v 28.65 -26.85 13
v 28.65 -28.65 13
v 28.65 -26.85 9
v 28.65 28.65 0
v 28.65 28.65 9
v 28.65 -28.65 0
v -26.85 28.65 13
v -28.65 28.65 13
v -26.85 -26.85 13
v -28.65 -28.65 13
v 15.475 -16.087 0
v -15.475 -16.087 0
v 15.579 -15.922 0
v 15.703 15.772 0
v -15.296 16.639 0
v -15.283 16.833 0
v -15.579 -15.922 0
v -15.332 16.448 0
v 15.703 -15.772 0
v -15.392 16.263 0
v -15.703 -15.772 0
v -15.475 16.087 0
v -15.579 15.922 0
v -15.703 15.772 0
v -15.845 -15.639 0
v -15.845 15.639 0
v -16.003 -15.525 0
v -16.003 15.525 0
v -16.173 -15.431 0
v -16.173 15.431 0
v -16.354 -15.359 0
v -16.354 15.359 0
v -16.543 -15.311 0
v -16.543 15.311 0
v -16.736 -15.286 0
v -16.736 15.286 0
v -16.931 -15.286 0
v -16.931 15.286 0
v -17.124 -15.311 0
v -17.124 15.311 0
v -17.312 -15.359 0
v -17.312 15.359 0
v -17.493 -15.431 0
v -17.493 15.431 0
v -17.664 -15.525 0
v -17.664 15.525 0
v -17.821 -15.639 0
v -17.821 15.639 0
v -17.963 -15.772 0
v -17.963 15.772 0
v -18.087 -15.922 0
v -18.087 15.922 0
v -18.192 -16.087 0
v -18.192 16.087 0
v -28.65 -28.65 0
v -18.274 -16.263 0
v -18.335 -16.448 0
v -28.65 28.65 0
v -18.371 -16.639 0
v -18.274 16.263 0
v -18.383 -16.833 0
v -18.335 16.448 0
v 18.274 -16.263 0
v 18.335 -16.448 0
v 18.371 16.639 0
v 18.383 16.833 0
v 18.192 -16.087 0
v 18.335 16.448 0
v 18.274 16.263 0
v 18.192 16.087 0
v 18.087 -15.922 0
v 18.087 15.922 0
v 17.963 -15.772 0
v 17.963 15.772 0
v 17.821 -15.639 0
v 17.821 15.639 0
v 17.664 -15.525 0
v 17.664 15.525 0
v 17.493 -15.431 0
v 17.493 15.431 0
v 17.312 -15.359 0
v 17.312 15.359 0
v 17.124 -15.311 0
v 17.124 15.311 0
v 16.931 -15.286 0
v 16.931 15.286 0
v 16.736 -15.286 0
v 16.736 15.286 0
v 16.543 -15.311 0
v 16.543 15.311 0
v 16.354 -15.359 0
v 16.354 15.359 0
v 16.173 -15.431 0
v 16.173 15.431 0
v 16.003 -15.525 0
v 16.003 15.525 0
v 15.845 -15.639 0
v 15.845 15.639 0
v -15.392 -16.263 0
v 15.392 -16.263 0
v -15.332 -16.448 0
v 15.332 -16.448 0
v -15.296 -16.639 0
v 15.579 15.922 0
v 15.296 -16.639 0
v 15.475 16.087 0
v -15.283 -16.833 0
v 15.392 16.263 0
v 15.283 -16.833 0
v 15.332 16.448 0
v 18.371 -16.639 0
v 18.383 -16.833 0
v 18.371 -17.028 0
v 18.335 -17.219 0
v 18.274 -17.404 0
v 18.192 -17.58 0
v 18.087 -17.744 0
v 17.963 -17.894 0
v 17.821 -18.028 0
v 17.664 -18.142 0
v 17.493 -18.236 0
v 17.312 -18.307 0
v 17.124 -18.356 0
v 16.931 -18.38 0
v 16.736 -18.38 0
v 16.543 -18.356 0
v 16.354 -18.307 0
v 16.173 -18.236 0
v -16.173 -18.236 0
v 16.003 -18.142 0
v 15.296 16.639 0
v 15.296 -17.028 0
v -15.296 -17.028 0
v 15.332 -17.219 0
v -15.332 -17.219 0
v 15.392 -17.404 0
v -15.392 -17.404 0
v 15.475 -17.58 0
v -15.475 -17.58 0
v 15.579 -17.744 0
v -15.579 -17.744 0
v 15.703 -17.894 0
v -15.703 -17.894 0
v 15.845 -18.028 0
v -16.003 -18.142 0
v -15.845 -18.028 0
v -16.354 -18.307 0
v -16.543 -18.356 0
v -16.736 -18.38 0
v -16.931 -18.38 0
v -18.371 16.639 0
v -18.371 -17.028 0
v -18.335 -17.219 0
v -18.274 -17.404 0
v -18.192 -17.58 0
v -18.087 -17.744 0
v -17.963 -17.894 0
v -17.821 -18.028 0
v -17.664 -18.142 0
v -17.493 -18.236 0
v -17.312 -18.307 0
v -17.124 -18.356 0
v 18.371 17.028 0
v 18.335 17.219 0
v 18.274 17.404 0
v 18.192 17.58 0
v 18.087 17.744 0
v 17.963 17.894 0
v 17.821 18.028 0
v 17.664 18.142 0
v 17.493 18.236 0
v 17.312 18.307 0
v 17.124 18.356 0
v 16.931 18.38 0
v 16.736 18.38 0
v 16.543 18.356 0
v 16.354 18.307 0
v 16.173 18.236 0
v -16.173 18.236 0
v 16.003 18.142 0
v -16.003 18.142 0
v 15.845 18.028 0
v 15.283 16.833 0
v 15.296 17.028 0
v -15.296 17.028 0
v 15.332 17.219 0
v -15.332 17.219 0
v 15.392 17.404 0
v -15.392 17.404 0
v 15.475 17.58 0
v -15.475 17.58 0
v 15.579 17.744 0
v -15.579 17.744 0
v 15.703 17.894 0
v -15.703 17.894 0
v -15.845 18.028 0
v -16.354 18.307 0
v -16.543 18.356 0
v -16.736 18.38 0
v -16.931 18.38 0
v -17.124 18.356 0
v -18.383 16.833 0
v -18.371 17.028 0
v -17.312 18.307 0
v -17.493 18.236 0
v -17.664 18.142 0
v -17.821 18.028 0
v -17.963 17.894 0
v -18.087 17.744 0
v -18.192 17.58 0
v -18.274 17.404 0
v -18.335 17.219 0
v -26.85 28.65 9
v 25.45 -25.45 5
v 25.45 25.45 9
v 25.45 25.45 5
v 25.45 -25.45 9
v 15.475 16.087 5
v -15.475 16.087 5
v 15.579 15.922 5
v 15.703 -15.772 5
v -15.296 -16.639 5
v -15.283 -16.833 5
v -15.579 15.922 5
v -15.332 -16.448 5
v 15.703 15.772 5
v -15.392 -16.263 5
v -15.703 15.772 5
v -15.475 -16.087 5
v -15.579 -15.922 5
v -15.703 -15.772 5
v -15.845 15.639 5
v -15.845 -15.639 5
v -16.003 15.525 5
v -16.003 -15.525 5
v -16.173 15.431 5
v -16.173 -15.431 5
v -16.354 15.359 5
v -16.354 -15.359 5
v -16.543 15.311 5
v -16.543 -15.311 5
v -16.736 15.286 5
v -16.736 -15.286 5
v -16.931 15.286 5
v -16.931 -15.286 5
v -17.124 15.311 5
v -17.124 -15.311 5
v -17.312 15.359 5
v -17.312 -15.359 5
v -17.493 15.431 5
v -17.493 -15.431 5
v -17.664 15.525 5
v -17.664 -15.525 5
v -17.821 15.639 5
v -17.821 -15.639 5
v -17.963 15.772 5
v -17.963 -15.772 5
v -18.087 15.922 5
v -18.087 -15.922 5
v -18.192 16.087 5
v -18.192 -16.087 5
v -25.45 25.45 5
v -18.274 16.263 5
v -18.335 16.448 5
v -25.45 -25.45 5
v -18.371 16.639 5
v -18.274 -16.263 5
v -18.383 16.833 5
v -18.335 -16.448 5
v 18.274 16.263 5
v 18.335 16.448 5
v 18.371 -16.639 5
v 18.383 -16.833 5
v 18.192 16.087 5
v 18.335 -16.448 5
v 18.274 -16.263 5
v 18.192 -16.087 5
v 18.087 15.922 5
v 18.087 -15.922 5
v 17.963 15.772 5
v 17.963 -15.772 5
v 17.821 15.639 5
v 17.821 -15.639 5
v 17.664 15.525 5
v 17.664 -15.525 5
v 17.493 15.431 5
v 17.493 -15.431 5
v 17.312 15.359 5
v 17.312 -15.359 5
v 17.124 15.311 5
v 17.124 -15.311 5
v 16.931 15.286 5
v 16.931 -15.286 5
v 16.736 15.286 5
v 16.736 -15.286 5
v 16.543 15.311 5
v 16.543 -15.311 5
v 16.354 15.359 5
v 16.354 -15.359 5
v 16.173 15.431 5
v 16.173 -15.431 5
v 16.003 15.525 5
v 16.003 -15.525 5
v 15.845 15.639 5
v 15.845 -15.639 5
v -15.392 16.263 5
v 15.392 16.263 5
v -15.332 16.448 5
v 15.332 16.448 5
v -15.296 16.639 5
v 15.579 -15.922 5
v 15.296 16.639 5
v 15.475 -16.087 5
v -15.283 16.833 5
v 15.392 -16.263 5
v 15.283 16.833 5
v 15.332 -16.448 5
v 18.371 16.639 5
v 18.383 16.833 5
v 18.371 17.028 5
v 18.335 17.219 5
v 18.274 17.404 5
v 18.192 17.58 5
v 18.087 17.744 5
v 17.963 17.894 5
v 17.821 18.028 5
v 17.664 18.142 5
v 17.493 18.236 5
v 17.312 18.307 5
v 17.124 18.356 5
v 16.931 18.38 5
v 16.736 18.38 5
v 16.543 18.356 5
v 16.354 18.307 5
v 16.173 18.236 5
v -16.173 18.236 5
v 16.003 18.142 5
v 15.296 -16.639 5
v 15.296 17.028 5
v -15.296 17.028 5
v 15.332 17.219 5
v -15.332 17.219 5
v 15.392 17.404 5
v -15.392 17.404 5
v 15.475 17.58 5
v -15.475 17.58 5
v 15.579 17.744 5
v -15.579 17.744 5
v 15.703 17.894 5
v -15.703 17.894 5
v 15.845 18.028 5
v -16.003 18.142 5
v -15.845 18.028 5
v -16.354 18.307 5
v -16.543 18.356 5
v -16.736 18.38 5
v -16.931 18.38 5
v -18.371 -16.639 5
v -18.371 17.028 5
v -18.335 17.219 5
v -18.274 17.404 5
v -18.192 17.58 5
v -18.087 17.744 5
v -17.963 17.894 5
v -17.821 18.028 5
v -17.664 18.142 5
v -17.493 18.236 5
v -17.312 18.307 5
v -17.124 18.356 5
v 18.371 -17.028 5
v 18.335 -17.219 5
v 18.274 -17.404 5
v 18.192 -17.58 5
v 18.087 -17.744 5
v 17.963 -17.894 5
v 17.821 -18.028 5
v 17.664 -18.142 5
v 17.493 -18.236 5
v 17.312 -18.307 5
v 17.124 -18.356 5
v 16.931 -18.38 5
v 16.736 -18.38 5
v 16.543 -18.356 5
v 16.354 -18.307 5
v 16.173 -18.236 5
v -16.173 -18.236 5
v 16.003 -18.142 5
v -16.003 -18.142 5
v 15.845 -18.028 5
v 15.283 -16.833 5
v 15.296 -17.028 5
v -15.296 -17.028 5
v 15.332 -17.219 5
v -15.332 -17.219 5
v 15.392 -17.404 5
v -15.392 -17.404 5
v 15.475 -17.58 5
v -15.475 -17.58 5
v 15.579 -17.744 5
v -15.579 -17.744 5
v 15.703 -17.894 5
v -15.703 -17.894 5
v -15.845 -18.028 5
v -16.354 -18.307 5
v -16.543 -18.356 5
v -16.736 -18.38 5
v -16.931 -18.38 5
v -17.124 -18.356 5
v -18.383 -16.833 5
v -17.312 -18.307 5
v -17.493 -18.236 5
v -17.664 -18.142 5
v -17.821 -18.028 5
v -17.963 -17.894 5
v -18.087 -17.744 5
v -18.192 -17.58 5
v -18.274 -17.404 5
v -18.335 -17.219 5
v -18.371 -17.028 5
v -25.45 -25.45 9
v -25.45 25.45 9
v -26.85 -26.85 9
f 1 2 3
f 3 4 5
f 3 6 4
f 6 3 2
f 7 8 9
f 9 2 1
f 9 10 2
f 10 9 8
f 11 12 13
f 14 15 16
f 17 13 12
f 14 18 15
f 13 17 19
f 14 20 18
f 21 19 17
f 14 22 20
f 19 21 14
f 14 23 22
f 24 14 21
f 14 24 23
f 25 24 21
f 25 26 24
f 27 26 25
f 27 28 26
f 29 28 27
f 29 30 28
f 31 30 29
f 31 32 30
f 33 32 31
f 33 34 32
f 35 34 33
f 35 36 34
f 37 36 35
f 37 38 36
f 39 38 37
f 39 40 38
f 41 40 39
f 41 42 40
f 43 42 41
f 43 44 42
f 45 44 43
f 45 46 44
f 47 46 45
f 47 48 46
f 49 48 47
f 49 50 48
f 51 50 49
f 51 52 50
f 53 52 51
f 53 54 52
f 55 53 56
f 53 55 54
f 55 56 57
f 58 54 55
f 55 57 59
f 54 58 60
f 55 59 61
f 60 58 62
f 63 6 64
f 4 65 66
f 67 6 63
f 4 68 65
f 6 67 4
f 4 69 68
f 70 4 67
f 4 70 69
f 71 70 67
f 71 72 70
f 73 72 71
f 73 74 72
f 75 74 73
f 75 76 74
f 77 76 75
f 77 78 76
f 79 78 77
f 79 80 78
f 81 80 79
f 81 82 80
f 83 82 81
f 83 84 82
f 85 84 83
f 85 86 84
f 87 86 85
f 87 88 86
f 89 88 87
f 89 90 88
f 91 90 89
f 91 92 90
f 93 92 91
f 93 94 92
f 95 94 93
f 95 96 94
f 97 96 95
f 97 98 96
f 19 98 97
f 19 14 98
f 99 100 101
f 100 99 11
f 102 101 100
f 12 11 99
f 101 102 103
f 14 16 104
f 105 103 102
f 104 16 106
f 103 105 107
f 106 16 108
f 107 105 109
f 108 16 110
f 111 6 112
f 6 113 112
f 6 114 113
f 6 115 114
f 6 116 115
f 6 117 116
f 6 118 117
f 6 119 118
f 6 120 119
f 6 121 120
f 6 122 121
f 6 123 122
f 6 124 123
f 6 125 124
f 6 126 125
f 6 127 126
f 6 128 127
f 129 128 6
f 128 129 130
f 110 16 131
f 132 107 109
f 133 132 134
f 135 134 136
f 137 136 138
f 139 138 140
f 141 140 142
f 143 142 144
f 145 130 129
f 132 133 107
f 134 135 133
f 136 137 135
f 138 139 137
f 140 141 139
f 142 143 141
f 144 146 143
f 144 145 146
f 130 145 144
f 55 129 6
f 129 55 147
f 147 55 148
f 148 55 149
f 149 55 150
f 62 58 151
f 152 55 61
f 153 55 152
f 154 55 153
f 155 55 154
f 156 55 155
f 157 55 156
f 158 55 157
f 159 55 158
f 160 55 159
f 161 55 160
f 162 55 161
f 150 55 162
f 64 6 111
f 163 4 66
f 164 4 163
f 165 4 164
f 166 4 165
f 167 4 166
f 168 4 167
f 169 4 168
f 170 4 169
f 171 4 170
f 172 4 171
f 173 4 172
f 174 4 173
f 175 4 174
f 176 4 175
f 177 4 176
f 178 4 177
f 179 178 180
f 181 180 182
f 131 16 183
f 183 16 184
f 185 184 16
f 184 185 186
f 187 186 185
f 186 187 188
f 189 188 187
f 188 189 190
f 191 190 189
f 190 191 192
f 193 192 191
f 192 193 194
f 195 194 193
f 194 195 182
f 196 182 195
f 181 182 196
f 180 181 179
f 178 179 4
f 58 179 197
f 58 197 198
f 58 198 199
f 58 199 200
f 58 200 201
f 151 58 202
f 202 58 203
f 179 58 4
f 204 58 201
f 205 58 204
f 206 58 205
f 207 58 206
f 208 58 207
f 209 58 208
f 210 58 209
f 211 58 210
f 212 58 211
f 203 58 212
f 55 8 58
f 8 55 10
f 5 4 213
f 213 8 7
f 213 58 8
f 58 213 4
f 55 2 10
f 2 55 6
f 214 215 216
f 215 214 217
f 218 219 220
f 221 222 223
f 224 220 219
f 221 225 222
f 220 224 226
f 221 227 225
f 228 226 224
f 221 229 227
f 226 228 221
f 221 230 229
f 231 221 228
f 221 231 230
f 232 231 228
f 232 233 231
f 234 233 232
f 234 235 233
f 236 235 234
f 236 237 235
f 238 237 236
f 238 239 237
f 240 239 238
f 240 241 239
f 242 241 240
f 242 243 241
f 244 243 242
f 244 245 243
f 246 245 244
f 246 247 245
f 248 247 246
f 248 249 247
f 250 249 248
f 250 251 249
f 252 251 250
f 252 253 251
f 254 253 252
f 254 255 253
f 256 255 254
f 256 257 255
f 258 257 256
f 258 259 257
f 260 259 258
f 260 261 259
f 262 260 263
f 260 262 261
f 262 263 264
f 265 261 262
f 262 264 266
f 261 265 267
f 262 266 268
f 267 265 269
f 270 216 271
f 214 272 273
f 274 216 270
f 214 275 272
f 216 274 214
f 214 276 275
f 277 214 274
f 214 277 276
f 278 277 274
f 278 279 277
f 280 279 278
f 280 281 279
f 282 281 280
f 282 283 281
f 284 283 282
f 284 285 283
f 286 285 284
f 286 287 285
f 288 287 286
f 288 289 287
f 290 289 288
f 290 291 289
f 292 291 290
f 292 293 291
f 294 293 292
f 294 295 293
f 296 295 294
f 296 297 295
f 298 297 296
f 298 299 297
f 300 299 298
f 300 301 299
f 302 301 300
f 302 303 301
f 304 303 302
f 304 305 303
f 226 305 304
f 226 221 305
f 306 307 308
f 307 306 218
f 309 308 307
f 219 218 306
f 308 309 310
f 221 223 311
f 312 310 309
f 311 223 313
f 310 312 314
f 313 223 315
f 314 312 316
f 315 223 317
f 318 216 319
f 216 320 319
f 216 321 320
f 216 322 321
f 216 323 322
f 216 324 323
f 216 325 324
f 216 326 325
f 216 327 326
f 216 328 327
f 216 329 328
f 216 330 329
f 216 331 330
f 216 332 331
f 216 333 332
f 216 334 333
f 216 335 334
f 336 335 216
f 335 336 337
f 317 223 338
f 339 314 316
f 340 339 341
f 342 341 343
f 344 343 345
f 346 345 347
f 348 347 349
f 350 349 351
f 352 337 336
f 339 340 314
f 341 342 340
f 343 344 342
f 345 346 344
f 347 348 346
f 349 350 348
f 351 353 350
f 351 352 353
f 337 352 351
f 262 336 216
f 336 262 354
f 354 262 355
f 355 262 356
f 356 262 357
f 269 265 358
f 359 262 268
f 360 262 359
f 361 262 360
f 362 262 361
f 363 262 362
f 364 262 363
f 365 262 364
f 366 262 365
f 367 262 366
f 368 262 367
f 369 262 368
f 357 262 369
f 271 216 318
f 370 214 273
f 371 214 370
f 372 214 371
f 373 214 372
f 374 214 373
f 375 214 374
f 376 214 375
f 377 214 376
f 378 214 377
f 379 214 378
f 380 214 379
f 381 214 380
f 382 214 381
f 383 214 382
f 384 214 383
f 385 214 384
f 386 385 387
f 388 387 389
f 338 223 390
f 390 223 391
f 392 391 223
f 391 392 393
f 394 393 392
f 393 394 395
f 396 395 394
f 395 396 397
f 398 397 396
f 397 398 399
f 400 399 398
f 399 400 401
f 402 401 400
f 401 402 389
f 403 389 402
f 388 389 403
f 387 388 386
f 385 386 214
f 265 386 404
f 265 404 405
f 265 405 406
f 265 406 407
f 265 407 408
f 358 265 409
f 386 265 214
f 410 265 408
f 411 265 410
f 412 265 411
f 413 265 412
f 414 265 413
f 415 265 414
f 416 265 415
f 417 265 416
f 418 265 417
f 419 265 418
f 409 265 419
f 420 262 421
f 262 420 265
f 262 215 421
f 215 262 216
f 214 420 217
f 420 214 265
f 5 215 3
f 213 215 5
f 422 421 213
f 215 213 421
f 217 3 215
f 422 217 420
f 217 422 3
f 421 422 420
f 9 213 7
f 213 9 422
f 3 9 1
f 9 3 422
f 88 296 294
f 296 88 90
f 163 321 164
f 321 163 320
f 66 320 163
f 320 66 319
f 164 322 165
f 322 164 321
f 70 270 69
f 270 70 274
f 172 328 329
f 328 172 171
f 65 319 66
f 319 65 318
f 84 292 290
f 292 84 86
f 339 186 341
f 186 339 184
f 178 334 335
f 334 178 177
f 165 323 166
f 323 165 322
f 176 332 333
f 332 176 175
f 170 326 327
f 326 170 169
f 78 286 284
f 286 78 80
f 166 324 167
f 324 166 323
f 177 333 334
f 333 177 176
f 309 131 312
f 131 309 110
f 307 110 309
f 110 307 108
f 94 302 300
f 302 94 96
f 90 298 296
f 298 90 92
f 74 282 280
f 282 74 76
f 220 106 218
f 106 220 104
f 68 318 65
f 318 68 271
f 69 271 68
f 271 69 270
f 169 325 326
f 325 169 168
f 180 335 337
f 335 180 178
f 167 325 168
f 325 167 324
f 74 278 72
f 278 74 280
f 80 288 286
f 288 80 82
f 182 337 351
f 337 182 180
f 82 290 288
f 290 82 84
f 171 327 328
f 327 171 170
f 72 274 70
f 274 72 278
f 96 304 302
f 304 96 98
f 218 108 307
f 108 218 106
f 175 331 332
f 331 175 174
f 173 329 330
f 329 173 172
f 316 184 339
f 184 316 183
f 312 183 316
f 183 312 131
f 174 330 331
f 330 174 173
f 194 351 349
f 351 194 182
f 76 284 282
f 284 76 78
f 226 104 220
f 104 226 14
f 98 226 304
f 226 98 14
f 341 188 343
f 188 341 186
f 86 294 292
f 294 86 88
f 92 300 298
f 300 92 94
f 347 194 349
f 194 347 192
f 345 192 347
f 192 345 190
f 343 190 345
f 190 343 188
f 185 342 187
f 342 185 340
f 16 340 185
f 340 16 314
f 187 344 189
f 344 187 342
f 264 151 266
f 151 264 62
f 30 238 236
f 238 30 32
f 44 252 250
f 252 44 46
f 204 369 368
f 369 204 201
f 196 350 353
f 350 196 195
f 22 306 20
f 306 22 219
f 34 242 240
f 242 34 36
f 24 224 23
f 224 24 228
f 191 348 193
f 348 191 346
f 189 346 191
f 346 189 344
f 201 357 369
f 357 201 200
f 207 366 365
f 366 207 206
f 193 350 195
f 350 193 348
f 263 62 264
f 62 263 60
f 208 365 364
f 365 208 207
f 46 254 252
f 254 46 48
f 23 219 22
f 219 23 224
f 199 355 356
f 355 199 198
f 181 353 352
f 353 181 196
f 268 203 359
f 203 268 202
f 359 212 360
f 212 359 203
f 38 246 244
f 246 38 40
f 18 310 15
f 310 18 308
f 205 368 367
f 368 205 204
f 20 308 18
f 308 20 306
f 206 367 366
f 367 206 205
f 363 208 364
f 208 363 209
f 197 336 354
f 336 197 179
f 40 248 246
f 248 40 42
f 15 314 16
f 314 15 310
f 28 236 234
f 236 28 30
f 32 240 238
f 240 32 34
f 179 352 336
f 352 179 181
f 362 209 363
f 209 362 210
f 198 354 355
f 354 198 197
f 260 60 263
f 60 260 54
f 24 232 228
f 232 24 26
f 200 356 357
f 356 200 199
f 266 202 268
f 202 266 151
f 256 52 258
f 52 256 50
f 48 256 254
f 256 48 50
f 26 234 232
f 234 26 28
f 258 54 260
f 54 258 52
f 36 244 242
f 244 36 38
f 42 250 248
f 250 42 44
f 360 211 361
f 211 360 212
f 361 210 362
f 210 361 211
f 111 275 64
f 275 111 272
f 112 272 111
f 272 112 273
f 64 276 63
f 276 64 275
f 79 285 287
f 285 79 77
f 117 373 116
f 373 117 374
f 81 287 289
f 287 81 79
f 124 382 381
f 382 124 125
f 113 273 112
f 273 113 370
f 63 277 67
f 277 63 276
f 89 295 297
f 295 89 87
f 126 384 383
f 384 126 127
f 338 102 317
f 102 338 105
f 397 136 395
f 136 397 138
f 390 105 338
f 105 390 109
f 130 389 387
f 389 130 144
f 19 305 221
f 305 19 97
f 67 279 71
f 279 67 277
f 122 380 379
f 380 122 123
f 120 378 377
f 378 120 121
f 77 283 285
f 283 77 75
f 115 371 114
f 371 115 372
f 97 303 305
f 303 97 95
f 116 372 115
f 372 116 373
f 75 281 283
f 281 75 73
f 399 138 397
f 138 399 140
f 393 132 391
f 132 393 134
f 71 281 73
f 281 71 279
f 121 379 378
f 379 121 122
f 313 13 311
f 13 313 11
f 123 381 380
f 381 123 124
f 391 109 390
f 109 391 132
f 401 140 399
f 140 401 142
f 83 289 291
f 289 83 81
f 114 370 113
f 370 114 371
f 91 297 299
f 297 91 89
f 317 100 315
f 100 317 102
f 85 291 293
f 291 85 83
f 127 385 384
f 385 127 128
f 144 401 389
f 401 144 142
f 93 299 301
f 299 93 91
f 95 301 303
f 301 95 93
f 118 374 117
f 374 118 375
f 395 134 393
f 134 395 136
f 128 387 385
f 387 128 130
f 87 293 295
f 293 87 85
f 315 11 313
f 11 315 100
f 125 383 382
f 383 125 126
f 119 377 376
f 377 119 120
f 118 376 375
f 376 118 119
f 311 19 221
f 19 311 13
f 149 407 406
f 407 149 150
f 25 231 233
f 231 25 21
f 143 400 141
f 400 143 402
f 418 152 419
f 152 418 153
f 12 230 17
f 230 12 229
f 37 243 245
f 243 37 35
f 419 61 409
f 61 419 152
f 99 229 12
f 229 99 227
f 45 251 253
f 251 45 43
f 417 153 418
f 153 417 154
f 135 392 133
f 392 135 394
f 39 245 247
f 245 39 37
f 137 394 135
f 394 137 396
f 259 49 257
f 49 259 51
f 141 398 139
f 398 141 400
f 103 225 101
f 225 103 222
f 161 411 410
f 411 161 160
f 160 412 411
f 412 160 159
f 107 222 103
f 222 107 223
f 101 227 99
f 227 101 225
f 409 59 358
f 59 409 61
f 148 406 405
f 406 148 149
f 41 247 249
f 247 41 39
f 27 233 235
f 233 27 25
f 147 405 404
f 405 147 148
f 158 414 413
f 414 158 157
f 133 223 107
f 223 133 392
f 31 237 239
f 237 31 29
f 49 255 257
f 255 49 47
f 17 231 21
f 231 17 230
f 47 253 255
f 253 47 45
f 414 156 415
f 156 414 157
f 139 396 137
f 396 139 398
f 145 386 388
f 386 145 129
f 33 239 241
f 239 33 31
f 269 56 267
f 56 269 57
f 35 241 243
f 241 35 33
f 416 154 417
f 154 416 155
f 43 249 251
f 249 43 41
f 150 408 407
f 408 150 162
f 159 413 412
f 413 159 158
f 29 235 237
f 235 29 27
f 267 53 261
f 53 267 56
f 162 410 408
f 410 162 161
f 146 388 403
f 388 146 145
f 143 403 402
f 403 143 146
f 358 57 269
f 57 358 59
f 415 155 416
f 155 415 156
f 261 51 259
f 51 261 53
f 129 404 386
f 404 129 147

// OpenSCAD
leg_size = 50.5;
leg_clearance = 0.2;
leg_offset = 1.6;
hole_size = 1.55; //radius, incl. clearance
hole_offset = leg_size/6;
stage_1 = 5;
stage_2 = 4;
stage_3 = 4;
wall = leg_offset;

difference(){

translate([0,0,(stage_1+stage_2+stage_3)/2])
cube([leg_size+(2*leg_clearance)+(2*leg_offset)+(2*wall),
    leg_size+(2*leg_clearance)+(2*leg_offset)+(2*wall),
    stage_1+stage_2+stage_3],center=true);

translate([0,0,((stage_2+stage_3)/2)+stage_1])
cube([leg_size+(2*leg_clearance),
    leg_size+(2*leg_clearance),
    stage_2+stage_3],center=true);

translate([(wall+leg_clearance)/2,(wall+leg_clearance)/2,(stage_3/2+stage_1+stage_2)])
cube([leg_size+(2*leg_offset)+wall+leg_clearance,
    leg_size+(2*leg_offset)+wall+leg_clearance,
    stage_3],center=true);

translate([((leg_size/2)-(hole_offset)),((leg_size/2)-(hole_offset)),stage_1/2])
cylinder(stage_1,hole_size,hole_size,center=true,$fn=50);

translate([-((leg_size/2)-(hole_offset)),((leg_size/2)-(hole_offset)),stage_1/2])
cylinder(stage_1,hole_size,hole_size,center=true,$fn=50);

translate([((leg_size/2)-(hole_offset)),-((leg_size/2)-(hole_offset)),stage_1/2])
cylinder(stage_1,hole_size,hole_size,center=true,$fn=50);

translate([-((leg_size/2)-(hole_offset)),-((leg_size/2)-(hole_offset)),stage_1/2])
cylinder(stage_1,hole_size,hole_size,center=true,$fn=50);
    
}
